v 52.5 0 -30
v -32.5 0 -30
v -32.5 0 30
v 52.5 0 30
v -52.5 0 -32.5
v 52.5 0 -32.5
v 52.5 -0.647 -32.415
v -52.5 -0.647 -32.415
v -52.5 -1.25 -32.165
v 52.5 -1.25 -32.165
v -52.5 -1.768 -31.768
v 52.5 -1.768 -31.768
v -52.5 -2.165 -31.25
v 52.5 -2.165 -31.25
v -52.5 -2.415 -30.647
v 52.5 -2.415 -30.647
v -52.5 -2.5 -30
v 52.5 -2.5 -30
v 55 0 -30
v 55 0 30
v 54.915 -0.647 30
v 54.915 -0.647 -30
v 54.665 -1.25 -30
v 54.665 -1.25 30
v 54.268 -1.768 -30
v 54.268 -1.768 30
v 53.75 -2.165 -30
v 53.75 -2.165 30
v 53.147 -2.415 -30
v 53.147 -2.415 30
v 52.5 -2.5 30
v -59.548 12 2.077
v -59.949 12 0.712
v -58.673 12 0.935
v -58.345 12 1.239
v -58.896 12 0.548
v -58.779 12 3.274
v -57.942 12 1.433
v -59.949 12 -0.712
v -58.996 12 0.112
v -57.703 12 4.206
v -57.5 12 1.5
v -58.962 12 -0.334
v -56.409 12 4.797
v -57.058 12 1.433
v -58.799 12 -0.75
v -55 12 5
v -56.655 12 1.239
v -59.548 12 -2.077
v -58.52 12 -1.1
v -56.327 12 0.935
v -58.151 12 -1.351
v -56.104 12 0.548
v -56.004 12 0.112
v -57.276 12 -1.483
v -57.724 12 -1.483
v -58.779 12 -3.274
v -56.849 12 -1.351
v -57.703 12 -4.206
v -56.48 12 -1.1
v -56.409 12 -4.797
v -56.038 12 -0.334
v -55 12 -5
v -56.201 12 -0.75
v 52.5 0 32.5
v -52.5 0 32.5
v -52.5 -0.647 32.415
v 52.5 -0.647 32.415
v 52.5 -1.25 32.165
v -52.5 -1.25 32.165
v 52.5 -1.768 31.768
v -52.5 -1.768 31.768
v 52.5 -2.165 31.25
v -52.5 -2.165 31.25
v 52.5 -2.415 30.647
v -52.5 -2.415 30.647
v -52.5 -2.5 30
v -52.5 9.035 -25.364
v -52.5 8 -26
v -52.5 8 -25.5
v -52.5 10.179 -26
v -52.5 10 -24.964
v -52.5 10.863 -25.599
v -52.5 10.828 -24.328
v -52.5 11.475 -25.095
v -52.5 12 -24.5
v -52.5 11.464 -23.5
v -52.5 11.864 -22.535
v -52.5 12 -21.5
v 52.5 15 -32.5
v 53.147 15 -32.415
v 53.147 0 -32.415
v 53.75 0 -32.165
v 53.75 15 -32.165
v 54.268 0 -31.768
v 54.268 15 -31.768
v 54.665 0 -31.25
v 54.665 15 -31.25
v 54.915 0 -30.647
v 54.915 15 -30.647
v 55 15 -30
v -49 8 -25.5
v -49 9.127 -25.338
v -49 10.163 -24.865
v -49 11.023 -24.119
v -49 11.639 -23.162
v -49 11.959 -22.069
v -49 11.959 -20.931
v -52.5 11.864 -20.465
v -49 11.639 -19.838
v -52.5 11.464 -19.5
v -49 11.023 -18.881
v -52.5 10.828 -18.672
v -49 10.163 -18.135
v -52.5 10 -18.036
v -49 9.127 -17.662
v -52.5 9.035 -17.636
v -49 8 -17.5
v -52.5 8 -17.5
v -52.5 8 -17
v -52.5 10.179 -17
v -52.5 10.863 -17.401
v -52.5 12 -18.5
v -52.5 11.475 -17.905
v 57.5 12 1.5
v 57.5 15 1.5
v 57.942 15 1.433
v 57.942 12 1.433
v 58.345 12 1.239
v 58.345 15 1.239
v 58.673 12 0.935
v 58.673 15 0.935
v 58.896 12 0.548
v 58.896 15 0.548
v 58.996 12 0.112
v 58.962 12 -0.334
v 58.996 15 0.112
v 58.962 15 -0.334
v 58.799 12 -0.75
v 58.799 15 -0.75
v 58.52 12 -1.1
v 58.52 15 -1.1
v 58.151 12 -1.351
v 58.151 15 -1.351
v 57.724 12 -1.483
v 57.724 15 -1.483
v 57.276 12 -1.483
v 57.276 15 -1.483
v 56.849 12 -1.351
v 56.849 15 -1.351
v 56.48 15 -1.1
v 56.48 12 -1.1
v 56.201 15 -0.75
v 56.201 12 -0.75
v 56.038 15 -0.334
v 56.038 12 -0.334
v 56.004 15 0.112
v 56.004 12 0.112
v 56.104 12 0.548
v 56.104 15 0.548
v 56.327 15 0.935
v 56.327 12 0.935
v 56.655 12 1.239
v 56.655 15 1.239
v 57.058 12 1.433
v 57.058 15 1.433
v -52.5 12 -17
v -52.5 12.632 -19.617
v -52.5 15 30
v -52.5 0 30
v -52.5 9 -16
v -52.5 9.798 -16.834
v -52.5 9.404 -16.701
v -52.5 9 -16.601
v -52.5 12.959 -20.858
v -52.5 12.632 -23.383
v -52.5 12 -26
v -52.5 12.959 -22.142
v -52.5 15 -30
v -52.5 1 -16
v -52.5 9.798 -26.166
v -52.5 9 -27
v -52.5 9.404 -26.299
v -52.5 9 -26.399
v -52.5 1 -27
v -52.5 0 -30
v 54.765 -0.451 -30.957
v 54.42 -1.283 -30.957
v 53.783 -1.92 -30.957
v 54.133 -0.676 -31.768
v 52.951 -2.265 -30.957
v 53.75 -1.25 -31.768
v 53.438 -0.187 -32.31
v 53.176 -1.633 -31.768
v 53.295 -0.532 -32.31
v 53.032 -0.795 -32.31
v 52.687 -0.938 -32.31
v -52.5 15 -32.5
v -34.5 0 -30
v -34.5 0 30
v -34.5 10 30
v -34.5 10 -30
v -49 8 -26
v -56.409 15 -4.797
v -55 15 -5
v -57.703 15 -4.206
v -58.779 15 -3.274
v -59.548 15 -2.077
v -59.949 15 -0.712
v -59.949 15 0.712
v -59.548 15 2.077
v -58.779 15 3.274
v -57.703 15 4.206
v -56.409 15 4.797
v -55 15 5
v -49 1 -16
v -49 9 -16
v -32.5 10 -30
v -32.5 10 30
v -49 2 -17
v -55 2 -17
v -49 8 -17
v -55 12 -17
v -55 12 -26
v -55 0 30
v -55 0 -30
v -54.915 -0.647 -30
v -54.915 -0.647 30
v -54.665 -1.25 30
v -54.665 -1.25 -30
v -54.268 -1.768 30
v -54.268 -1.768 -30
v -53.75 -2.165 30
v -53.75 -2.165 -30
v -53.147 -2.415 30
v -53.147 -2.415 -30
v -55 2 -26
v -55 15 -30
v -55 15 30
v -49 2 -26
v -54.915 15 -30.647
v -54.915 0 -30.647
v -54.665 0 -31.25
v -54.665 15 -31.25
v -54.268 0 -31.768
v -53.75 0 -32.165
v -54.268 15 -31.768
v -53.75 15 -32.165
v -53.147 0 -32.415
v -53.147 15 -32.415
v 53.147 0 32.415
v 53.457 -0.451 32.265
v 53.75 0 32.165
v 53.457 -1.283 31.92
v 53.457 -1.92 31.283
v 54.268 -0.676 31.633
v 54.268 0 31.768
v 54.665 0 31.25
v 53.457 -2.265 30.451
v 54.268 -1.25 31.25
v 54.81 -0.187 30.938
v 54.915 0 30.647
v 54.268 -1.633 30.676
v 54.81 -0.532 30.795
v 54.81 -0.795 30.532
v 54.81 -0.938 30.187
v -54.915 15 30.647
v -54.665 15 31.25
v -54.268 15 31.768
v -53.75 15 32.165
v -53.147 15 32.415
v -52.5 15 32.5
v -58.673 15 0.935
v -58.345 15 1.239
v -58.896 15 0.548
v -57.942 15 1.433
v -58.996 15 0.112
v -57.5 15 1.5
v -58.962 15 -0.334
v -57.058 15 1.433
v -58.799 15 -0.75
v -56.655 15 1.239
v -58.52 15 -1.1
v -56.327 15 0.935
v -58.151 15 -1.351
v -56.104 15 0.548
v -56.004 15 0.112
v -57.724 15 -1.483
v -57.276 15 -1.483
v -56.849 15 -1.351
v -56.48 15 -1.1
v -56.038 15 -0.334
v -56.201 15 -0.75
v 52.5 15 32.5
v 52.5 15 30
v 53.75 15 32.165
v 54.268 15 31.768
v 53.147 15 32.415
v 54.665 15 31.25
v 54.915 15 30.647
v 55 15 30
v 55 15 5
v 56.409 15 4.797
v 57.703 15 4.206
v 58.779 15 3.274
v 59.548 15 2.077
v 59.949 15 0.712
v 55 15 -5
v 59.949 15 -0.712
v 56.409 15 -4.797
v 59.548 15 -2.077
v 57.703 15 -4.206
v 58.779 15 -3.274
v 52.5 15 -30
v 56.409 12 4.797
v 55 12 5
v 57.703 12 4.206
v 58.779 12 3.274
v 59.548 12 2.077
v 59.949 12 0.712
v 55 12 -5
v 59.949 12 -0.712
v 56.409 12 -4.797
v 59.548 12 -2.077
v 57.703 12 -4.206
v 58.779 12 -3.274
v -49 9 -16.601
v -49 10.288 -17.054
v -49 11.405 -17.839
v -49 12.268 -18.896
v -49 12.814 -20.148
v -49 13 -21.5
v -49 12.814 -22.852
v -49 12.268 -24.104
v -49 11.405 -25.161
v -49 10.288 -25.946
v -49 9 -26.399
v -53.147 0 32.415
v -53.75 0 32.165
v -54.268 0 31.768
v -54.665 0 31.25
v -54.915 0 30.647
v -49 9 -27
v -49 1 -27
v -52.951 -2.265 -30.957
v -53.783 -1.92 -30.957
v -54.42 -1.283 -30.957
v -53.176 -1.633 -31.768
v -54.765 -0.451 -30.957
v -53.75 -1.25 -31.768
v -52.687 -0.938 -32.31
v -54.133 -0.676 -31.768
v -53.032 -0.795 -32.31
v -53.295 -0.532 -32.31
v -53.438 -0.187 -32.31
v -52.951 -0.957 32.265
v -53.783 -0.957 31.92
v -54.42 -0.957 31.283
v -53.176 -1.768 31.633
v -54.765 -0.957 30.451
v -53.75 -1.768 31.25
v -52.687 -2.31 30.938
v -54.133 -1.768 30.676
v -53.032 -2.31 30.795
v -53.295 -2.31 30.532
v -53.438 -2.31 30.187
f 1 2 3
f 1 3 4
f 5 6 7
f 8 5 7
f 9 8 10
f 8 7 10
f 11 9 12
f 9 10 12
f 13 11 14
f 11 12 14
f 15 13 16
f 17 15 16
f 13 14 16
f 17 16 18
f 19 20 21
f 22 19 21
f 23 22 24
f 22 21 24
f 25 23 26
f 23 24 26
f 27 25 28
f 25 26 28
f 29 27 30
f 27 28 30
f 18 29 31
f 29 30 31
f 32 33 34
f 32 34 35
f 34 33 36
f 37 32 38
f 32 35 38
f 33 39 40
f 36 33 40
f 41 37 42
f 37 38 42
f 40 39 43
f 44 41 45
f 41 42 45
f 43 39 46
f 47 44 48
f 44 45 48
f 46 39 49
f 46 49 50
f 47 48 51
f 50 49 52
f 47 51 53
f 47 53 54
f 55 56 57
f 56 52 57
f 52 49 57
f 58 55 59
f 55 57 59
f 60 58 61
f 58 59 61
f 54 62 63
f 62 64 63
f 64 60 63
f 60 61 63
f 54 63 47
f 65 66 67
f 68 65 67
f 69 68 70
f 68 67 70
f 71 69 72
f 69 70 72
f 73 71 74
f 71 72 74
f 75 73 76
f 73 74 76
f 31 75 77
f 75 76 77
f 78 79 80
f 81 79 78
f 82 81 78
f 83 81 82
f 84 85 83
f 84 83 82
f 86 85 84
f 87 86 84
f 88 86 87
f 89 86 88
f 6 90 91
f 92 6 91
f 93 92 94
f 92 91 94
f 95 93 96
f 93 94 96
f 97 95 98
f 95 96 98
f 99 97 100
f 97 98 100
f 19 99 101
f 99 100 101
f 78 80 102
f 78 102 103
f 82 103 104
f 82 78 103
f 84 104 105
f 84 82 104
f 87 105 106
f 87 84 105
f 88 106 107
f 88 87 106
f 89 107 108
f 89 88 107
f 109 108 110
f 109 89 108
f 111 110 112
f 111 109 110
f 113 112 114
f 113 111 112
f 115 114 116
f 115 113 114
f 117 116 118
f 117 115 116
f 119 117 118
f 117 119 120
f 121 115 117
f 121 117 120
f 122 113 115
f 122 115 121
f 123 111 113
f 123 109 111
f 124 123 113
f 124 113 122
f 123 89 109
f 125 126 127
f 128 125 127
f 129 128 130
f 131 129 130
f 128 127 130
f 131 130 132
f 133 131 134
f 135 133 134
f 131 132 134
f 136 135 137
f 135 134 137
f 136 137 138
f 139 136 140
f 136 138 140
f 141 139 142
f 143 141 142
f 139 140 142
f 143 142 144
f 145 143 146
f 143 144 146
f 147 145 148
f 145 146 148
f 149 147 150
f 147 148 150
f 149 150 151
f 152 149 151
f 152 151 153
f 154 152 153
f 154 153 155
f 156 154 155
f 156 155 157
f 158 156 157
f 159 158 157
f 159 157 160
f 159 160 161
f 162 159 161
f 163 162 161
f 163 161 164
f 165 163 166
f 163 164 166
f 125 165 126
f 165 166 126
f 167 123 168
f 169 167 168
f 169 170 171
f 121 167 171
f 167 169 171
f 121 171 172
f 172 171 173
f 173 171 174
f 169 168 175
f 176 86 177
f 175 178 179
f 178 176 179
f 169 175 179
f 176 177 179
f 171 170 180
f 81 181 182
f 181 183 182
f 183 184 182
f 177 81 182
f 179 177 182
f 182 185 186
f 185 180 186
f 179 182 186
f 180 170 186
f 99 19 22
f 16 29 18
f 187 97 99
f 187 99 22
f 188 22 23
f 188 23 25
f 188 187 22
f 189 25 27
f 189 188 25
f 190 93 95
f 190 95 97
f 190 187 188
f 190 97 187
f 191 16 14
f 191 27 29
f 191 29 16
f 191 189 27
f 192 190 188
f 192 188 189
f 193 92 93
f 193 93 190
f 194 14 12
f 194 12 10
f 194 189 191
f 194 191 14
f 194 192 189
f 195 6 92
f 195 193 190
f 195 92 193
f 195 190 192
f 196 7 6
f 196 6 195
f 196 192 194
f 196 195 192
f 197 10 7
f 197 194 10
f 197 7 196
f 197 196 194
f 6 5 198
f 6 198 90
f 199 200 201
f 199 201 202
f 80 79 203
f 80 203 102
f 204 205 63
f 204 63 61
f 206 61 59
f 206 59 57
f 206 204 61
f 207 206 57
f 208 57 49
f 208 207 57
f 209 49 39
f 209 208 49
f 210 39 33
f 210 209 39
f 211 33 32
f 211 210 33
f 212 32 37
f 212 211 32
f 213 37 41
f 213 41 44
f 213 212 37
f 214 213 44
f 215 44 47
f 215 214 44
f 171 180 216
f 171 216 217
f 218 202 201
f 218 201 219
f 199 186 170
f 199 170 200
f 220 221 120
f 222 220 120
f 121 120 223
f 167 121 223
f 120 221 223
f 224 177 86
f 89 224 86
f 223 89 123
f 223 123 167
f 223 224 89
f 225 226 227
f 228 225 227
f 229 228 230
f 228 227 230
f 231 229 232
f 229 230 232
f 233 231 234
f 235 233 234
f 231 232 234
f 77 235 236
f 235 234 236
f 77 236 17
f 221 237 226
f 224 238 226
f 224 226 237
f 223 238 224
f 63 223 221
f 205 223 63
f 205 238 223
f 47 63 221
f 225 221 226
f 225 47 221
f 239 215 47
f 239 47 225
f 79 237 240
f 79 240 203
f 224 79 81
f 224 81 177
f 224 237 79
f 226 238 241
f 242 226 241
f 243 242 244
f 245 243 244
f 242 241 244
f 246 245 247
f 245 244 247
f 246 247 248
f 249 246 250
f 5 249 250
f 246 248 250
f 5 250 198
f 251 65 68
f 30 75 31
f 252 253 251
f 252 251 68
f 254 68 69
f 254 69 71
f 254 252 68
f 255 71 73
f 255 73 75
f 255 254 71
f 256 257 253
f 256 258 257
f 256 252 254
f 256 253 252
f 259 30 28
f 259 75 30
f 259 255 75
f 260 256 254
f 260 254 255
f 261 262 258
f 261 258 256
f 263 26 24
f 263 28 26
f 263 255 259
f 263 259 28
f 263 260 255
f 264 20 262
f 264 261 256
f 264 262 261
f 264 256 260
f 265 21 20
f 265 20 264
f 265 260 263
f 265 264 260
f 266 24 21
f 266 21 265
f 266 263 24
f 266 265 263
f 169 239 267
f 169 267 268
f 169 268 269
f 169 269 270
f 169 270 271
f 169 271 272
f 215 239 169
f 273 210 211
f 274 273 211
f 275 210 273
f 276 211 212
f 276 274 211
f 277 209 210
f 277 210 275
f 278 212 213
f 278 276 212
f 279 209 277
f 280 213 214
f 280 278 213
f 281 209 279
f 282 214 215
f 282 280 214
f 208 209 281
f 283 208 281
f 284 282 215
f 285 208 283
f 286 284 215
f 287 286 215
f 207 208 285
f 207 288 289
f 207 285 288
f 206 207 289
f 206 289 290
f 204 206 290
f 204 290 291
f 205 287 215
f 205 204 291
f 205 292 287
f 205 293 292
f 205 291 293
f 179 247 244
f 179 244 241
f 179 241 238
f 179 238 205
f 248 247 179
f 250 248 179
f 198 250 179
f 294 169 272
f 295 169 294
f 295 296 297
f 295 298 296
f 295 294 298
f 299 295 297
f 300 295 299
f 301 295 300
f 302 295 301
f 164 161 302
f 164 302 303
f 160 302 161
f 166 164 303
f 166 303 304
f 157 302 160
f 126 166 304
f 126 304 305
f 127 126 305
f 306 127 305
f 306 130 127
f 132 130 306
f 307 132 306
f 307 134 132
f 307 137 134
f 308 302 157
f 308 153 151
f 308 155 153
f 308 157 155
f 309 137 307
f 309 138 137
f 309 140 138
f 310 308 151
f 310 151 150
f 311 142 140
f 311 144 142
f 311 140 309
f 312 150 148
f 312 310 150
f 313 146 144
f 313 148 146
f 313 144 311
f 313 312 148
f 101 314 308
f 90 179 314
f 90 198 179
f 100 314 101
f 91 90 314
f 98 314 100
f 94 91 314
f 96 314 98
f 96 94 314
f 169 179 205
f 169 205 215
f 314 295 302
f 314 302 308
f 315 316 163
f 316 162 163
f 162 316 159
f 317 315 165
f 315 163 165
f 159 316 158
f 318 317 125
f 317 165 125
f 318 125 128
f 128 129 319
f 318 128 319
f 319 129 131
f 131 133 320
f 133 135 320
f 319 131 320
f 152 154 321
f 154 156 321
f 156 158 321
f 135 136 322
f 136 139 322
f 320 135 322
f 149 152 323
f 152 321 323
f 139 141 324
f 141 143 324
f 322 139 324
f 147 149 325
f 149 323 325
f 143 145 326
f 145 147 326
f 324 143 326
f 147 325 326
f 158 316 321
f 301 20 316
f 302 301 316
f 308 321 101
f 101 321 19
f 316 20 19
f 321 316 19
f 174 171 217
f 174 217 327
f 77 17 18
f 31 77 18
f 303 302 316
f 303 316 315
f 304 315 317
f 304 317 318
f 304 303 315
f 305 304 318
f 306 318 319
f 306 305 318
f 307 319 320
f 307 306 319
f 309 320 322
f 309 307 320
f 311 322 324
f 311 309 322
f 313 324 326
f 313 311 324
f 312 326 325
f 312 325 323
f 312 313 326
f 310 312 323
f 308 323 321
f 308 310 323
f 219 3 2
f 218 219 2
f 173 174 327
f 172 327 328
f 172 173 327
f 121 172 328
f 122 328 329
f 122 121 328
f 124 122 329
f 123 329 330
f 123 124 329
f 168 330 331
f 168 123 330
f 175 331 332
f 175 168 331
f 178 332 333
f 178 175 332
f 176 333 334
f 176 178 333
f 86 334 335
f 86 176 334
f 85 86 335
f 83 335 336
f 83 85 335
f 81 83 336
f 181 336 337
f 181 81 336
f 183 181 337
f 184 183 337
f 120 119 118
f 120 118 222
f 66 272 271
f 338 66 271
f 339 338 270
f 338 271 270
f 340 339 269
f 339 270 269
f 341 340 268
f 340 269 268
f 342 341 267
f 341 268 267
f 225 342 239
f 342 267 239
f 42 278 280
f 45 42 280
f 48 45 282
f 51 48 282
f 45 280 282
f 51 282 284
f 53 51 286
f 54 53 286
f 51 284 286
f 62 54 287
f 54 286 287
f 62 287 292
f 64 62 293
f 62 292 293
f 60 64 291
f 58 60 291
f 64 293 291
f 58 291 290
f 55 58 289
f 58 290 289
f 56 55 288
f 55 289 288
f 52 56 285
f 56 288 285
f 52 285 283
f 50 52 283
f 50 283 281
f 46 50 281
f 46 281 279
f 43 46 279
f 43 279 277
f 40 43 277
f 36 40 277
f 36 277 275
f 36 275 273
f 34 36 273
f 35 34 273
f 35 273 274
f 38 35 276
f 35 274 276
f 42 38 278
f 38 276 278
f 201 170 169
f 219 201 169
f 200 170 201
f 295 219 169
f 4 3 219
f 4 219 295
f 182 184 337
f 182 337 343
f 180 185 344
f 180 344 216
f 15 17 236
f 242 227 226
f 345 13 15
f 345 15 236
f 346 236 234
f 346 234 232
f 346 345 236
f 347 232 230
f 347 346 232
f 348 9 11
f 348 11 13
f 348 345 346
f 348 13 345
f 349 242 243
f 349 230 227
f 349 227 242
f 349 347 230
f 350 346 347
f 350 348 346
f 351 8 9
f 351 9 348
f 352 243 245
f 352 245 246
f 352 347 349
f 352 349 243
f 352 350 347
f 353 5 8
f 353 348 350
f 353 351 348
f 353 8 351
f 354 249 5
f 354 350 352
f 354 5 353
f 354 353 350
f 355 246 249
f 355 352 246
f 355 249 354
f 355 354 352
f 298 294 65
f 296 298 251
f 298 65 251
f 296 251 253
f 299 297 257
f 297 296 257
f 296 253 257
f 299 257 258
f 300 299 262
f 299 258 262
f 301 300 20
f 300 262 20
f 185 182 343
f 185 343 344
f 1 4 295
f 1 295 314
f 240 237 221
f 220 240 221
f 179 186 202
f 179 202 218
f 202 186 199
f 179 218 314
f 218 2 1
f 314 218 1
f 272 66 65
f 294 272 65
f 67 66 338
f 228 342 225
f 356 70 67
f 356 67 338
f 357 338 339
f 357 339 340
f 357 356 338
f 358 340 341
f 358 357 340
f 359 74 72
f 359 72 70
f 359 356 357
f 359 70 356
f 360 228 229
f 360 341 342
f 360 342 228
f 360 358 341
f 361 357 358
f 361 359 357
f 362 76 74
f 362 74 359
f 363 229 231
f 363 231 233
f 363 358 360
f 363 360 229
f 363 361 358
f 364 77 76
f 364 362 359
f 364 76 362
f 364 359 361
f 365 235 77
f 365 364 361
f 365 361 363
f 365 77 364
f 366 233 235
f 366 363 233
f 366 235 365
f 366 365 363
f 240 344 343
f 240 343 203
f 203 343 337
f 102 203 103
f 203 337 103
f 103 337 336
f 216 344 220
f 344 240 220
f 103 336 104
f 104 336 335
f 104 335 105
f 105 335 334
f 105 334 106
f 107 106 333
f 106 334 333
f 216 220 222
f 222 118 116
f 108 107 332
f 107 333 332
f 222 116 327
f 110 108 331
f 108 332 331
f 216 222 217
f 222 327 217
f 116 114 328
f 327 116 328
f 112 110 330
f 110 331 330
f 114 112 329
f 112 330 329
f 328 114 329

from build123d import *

# Parameters (mm, degrees)
SKETCH1_W           = 105
SKETCH1_H           = 60
BOSS_EXTRUDE1_DEPTH = 15
SHELL1_T            = 2.5
FILLET1_R           = 2.5
SKETCH3_R           = 1.5
BOSS_EXTRUDE2_DEPTH = 3
SKETCH4_W           = 2
SKETCH4_H           = 60
BOSS_EXTRUDE3_DEPTH = 10
BOSS_EXTRUDE4_DEPTH = 6
SKETCH7_W           = 9
SKETCH7_H           = 10
CUT_EXTRUDE1_DEPTH  = 2.5


with BuildPart() as part:
    # Sketch1 → Boss-Extrude1 (new body)
    with BuildSketch(Plane(origin=(0, 0, 0), x_dir=(1, 0, 0), z_dir=(0, 1, 0))):
        Rectangle(SKETCH1_W, SKETCH1_H)
    extrude(amount=BOSS_EXTRUDE1_DEPTH)

    # Shell1
    shell1_openings = [part.faces().sort_by_distance(p)[0] for p in [
        (0, 15, 0),
    ]]
    offset(amount=SHELL1_T, openings=shell1_openings, kind=Kind.INTERSECTION)

    # Fillet1
    # the kernel refuses this fillet: 2.5 mm, written as the material it takes off along each edge
    with BuildSketch(Plane(origin=(52.5, 0, -30), x_dir=(1, 0, 0), z_dir=(0, 0, -1))) as fillet1_piece_1_section:
        Polygon((0, 0), (FILLET1_R, 0), (FILLET1_R, FILLET1_R), (0, FILLET1_R), align=None)
    fillet1_piece_1 = extrude(amount=FILLET1_R, mode=Mode.PRIVATE)
    fillet1_piece_1 = fillet1_piece_1 - Plane(origin=(52.5, 0, -30), x_dir=(-0.7071067811865475, 0.7071067811865475, 0), z_dir=(0, 0, -1)) * Sphere(FILLET1_R, mode=Mode.PRIVATE)
    add(fillet1_piece_1, mode=Mode.SUBTRACT)
    with BuildSketch(Plane(origin=(-52.5, 0, -30), x_dir=(0, -1, 0), z_dir=(0, 0, -1))) as fillet1_piece_2_section:
        Polygon((0, 0), (FILLET1_R, 0), (FILLET1_R, FILLET1_R), (0, FILLET1_R), align=None)
    fillet1_piece_2 = extrude(amount=FILLET1_R, mode=Mode.PRIVATE)
    fillet1_piece_2 = fillet1_piece_2 - Plane(origin=(-52.5, 0, -30), x_dir=(0.7071067811865475, 0.7071067811865475, 0), z_dir=(0, 0, -1)) * Sphere(FILLET1_R, mode=Mode.PRIVATE)
    add(fillet1_piece_2, mode=Mode.SUBTRACT)
    with BuildSketch(Plane(origin=(52.5, 0, 30), x_dir=(0, -1, 0), z_dir=(1, 0, 0))) as fillet1_piece_3_section:
        Polygon((0, 0), (FILLET1_R, 0), (FILLET1_R, -FILLET1_R), (0, -FILLET1_R), align=None)
    fillet1_piece_3 = extrude(amount=FILLET1_R, mode=Mode.PRIVATE)
    fillet1_piece_3 = fillet1_piece_3 - Plane(origin=(52.5, 0, 30), x_dir=(0, 0.7071067811865475, -0.7071067811865475), z_dir=(1, 0, 0)) * Sphere(FILLET1_R, mode=Mode.PRIVATE)
    add(fillet1_piece_3, mode=Mode.SUBTRACT)
    with BuildSketch(Plane(origin=(-52.5, 0, 30), x_dir=(0, 0, 1), z_dir=(0, -1, 0))) as fillet1_piece_4_section:
        Polygon((0, 0), (FILLET1_R, 0), (FILLET1_R, FILLET1_R), (0, FILLET1_R), align=None)
    fillet1_piece_4 = extrude(amount=FILLET1_R, mode=Mode.PRIVATE)
    fillet1_piece_4 = fillet1_piece_4 - Plane(origin=(-52.5, 0, 30), x_dir=(0.7071067811865475, 0, -0.7071067811865476), z_dir=(0, -1, 0)) * Sphere(FILLET1_R, mode=Mode.PRIVATE)
    add(fillet1_piece_4, mode=Mode.SUBTRACT)
    with BuildSketch(Plane(origin=(52.5, -2.5, -32.5), x_dir=(0, 1, 0), z_dir=(-1, 0, 0)), Plane(origin=(-52.5, -2.5, 32.5), x_dir=(0, 1, 0), z_dir=(1, 0, 0))) as fillet1_piece_5:
        with BuildLine():
            CenterArc((FILLET1_R, -FILLET1_R), FILLET1_R, 90, 90)
            Line((0, -FILLET1_R), (0, 0))
            Line((0, 0), (FILLET1_R, 0))
        make_face()
    extrude(amount=105, mode=Mode.SUBTRACT)
    with BuildSketch(Plane(origin=(55, -2.5, 30), x_dir=(0, 1, 0), z_dir=(0, 0, -1)), Plane(origin=(-55, -2.5, -30), x_dir=(0, 1, 0), z_dir=(0, 0, 1))) as fillet1_piece_6:
        with BuildLine():
            CenterArc((FILLET1_R, -FILLET1_R), FILLET1_R, 90, 90)
            Line((0, -FILLET1_R), (0, 0))
            Line((0, 0), (FILLET1_R, 0))
        make_face()
    extrude(amount=60, mode=Mode.SUBTRACT)
    with BuildSketch(Plane(origin=(-55, 21.25, -32.5), x_dir=(0, 0, 1), z_dir=(0, -1, 0)), Plane(origin=(55, 21.25, -32.5), x_dir=(-1, 0, 0), z_dir=(0, -1, 0)), Plane(origin=(55, 0, 32.5), x_dir=(-1, 0, 0), z_dir=(0, 1, 0)), Plane(origin=(-55, 21.25, 32.5), x_dir=(1, 0, 0), z_dir=(0, -1, 0))) as fillet1_piece_7:
        with BuildLine():
            CenterArc((FILLET1_R, -FILLET1_R), FILLET1_R, 90, 90)
            Line((0, -FILLET1_R), (0, 0))
            Line((0, 0), (FILLET1_R, 0))
        make_face()
    extrude(amount=21.25, mode=Mode.SUBTRACT)

    # Sketch3 → Boss-Extrude2 (add)
    # profile 1 of 2: a face of its own
    with BuildSketch(Plane(origin=(0, 15, 0), x_dir=(1, 0, 0), z_dir=(0, 1, 0))):
        with BuildLine():
            Line((55, 5), (55, -5))
            ThreePointArc((55, -5), (60, 0), (55, 5))
        make_face()
        with Locations(Location((57.5, 0, 0), (0, 0, 270))):
            Circle(SKETCH3_R, mode=Mode.SUBTRACT)
    # profile 2 of 2: a face of its own
    with BuildSketch(Plane(origin=(0, 15, 0), x_dir=(1, 0, 0), z_dir=(0, 1, 0))):
        with BuildLine():
            ThreePointArc((-55, 5), (-60, 0), (-55, -5))
            Line((-55, -5), (-55, 5))
        make_face()
        with Locations(Location((-57.5, 0, 0), (0, 0, 270))):
            Circle(SKETCH3_R, mode=Mode.SUBTRACT)
    extrude(amount=-BOSS_EXTRUDE2_DEPTH)

    # Sketch4 → Boss-Extrude3 (add)
    with BuildSketch(Plane(origin=(0, 0, 0), x_dir=(1, 0, 0), z_dir=(0, 1, 0))):
        with Locations((-33.5, 0)):
            Rectangle(SKETCH4_W, SKETCH4_H)
    extrude(amount=BOSS_EXTRUDE3_DEPTH)

    # Sketch5 → Boss-Extrude4 (add)
    with BuildSketch(Plane.ZY.offset(55)):
        with BuildLine():
            Line((-27, 9), (-27, 1))
            Line((-27, 1), (-16, 1))
            Line((-16, 1), (-16, 9))
            Line((-16, 9), (-16.601020514, 9))
            ThreePointArc((-16.601020514, 9), (-21.5, 13), (-26.398979486, 9))
            Line((-26.398979486, 9), (-27, 9))
        make_face()
        with BuildLine():
            Line((-17.5, 8), (-17, 8))
            Line((-17, 8), (-17, 2))
            Line((-17, 2), (-26, 2))
            Line((-26, 2), (-26, 8))
            Line((-26, 8), (-25.5, 8))
            ThreePointArc((-25.5, 8), (-21.5, 12), (-17.5, 8))
        make_face(mode=Mode.SUBTRACT)
    extrude(amount=-BOSS_EXTRUDE4_DEPTH)

    # Sketch7 → Cut-Extrude1 (cut)
    with BuildSketch(Plane.ZY.offset(55)):
        with Locations((-21.5, 7)):
            Rectangle(SKETCH7_W, SKETCH7_H)
    extrude(amount=-CUT_EXTRUDE1_DEPTH, mode=Mode.SUBTRACT)


solid = part.part
